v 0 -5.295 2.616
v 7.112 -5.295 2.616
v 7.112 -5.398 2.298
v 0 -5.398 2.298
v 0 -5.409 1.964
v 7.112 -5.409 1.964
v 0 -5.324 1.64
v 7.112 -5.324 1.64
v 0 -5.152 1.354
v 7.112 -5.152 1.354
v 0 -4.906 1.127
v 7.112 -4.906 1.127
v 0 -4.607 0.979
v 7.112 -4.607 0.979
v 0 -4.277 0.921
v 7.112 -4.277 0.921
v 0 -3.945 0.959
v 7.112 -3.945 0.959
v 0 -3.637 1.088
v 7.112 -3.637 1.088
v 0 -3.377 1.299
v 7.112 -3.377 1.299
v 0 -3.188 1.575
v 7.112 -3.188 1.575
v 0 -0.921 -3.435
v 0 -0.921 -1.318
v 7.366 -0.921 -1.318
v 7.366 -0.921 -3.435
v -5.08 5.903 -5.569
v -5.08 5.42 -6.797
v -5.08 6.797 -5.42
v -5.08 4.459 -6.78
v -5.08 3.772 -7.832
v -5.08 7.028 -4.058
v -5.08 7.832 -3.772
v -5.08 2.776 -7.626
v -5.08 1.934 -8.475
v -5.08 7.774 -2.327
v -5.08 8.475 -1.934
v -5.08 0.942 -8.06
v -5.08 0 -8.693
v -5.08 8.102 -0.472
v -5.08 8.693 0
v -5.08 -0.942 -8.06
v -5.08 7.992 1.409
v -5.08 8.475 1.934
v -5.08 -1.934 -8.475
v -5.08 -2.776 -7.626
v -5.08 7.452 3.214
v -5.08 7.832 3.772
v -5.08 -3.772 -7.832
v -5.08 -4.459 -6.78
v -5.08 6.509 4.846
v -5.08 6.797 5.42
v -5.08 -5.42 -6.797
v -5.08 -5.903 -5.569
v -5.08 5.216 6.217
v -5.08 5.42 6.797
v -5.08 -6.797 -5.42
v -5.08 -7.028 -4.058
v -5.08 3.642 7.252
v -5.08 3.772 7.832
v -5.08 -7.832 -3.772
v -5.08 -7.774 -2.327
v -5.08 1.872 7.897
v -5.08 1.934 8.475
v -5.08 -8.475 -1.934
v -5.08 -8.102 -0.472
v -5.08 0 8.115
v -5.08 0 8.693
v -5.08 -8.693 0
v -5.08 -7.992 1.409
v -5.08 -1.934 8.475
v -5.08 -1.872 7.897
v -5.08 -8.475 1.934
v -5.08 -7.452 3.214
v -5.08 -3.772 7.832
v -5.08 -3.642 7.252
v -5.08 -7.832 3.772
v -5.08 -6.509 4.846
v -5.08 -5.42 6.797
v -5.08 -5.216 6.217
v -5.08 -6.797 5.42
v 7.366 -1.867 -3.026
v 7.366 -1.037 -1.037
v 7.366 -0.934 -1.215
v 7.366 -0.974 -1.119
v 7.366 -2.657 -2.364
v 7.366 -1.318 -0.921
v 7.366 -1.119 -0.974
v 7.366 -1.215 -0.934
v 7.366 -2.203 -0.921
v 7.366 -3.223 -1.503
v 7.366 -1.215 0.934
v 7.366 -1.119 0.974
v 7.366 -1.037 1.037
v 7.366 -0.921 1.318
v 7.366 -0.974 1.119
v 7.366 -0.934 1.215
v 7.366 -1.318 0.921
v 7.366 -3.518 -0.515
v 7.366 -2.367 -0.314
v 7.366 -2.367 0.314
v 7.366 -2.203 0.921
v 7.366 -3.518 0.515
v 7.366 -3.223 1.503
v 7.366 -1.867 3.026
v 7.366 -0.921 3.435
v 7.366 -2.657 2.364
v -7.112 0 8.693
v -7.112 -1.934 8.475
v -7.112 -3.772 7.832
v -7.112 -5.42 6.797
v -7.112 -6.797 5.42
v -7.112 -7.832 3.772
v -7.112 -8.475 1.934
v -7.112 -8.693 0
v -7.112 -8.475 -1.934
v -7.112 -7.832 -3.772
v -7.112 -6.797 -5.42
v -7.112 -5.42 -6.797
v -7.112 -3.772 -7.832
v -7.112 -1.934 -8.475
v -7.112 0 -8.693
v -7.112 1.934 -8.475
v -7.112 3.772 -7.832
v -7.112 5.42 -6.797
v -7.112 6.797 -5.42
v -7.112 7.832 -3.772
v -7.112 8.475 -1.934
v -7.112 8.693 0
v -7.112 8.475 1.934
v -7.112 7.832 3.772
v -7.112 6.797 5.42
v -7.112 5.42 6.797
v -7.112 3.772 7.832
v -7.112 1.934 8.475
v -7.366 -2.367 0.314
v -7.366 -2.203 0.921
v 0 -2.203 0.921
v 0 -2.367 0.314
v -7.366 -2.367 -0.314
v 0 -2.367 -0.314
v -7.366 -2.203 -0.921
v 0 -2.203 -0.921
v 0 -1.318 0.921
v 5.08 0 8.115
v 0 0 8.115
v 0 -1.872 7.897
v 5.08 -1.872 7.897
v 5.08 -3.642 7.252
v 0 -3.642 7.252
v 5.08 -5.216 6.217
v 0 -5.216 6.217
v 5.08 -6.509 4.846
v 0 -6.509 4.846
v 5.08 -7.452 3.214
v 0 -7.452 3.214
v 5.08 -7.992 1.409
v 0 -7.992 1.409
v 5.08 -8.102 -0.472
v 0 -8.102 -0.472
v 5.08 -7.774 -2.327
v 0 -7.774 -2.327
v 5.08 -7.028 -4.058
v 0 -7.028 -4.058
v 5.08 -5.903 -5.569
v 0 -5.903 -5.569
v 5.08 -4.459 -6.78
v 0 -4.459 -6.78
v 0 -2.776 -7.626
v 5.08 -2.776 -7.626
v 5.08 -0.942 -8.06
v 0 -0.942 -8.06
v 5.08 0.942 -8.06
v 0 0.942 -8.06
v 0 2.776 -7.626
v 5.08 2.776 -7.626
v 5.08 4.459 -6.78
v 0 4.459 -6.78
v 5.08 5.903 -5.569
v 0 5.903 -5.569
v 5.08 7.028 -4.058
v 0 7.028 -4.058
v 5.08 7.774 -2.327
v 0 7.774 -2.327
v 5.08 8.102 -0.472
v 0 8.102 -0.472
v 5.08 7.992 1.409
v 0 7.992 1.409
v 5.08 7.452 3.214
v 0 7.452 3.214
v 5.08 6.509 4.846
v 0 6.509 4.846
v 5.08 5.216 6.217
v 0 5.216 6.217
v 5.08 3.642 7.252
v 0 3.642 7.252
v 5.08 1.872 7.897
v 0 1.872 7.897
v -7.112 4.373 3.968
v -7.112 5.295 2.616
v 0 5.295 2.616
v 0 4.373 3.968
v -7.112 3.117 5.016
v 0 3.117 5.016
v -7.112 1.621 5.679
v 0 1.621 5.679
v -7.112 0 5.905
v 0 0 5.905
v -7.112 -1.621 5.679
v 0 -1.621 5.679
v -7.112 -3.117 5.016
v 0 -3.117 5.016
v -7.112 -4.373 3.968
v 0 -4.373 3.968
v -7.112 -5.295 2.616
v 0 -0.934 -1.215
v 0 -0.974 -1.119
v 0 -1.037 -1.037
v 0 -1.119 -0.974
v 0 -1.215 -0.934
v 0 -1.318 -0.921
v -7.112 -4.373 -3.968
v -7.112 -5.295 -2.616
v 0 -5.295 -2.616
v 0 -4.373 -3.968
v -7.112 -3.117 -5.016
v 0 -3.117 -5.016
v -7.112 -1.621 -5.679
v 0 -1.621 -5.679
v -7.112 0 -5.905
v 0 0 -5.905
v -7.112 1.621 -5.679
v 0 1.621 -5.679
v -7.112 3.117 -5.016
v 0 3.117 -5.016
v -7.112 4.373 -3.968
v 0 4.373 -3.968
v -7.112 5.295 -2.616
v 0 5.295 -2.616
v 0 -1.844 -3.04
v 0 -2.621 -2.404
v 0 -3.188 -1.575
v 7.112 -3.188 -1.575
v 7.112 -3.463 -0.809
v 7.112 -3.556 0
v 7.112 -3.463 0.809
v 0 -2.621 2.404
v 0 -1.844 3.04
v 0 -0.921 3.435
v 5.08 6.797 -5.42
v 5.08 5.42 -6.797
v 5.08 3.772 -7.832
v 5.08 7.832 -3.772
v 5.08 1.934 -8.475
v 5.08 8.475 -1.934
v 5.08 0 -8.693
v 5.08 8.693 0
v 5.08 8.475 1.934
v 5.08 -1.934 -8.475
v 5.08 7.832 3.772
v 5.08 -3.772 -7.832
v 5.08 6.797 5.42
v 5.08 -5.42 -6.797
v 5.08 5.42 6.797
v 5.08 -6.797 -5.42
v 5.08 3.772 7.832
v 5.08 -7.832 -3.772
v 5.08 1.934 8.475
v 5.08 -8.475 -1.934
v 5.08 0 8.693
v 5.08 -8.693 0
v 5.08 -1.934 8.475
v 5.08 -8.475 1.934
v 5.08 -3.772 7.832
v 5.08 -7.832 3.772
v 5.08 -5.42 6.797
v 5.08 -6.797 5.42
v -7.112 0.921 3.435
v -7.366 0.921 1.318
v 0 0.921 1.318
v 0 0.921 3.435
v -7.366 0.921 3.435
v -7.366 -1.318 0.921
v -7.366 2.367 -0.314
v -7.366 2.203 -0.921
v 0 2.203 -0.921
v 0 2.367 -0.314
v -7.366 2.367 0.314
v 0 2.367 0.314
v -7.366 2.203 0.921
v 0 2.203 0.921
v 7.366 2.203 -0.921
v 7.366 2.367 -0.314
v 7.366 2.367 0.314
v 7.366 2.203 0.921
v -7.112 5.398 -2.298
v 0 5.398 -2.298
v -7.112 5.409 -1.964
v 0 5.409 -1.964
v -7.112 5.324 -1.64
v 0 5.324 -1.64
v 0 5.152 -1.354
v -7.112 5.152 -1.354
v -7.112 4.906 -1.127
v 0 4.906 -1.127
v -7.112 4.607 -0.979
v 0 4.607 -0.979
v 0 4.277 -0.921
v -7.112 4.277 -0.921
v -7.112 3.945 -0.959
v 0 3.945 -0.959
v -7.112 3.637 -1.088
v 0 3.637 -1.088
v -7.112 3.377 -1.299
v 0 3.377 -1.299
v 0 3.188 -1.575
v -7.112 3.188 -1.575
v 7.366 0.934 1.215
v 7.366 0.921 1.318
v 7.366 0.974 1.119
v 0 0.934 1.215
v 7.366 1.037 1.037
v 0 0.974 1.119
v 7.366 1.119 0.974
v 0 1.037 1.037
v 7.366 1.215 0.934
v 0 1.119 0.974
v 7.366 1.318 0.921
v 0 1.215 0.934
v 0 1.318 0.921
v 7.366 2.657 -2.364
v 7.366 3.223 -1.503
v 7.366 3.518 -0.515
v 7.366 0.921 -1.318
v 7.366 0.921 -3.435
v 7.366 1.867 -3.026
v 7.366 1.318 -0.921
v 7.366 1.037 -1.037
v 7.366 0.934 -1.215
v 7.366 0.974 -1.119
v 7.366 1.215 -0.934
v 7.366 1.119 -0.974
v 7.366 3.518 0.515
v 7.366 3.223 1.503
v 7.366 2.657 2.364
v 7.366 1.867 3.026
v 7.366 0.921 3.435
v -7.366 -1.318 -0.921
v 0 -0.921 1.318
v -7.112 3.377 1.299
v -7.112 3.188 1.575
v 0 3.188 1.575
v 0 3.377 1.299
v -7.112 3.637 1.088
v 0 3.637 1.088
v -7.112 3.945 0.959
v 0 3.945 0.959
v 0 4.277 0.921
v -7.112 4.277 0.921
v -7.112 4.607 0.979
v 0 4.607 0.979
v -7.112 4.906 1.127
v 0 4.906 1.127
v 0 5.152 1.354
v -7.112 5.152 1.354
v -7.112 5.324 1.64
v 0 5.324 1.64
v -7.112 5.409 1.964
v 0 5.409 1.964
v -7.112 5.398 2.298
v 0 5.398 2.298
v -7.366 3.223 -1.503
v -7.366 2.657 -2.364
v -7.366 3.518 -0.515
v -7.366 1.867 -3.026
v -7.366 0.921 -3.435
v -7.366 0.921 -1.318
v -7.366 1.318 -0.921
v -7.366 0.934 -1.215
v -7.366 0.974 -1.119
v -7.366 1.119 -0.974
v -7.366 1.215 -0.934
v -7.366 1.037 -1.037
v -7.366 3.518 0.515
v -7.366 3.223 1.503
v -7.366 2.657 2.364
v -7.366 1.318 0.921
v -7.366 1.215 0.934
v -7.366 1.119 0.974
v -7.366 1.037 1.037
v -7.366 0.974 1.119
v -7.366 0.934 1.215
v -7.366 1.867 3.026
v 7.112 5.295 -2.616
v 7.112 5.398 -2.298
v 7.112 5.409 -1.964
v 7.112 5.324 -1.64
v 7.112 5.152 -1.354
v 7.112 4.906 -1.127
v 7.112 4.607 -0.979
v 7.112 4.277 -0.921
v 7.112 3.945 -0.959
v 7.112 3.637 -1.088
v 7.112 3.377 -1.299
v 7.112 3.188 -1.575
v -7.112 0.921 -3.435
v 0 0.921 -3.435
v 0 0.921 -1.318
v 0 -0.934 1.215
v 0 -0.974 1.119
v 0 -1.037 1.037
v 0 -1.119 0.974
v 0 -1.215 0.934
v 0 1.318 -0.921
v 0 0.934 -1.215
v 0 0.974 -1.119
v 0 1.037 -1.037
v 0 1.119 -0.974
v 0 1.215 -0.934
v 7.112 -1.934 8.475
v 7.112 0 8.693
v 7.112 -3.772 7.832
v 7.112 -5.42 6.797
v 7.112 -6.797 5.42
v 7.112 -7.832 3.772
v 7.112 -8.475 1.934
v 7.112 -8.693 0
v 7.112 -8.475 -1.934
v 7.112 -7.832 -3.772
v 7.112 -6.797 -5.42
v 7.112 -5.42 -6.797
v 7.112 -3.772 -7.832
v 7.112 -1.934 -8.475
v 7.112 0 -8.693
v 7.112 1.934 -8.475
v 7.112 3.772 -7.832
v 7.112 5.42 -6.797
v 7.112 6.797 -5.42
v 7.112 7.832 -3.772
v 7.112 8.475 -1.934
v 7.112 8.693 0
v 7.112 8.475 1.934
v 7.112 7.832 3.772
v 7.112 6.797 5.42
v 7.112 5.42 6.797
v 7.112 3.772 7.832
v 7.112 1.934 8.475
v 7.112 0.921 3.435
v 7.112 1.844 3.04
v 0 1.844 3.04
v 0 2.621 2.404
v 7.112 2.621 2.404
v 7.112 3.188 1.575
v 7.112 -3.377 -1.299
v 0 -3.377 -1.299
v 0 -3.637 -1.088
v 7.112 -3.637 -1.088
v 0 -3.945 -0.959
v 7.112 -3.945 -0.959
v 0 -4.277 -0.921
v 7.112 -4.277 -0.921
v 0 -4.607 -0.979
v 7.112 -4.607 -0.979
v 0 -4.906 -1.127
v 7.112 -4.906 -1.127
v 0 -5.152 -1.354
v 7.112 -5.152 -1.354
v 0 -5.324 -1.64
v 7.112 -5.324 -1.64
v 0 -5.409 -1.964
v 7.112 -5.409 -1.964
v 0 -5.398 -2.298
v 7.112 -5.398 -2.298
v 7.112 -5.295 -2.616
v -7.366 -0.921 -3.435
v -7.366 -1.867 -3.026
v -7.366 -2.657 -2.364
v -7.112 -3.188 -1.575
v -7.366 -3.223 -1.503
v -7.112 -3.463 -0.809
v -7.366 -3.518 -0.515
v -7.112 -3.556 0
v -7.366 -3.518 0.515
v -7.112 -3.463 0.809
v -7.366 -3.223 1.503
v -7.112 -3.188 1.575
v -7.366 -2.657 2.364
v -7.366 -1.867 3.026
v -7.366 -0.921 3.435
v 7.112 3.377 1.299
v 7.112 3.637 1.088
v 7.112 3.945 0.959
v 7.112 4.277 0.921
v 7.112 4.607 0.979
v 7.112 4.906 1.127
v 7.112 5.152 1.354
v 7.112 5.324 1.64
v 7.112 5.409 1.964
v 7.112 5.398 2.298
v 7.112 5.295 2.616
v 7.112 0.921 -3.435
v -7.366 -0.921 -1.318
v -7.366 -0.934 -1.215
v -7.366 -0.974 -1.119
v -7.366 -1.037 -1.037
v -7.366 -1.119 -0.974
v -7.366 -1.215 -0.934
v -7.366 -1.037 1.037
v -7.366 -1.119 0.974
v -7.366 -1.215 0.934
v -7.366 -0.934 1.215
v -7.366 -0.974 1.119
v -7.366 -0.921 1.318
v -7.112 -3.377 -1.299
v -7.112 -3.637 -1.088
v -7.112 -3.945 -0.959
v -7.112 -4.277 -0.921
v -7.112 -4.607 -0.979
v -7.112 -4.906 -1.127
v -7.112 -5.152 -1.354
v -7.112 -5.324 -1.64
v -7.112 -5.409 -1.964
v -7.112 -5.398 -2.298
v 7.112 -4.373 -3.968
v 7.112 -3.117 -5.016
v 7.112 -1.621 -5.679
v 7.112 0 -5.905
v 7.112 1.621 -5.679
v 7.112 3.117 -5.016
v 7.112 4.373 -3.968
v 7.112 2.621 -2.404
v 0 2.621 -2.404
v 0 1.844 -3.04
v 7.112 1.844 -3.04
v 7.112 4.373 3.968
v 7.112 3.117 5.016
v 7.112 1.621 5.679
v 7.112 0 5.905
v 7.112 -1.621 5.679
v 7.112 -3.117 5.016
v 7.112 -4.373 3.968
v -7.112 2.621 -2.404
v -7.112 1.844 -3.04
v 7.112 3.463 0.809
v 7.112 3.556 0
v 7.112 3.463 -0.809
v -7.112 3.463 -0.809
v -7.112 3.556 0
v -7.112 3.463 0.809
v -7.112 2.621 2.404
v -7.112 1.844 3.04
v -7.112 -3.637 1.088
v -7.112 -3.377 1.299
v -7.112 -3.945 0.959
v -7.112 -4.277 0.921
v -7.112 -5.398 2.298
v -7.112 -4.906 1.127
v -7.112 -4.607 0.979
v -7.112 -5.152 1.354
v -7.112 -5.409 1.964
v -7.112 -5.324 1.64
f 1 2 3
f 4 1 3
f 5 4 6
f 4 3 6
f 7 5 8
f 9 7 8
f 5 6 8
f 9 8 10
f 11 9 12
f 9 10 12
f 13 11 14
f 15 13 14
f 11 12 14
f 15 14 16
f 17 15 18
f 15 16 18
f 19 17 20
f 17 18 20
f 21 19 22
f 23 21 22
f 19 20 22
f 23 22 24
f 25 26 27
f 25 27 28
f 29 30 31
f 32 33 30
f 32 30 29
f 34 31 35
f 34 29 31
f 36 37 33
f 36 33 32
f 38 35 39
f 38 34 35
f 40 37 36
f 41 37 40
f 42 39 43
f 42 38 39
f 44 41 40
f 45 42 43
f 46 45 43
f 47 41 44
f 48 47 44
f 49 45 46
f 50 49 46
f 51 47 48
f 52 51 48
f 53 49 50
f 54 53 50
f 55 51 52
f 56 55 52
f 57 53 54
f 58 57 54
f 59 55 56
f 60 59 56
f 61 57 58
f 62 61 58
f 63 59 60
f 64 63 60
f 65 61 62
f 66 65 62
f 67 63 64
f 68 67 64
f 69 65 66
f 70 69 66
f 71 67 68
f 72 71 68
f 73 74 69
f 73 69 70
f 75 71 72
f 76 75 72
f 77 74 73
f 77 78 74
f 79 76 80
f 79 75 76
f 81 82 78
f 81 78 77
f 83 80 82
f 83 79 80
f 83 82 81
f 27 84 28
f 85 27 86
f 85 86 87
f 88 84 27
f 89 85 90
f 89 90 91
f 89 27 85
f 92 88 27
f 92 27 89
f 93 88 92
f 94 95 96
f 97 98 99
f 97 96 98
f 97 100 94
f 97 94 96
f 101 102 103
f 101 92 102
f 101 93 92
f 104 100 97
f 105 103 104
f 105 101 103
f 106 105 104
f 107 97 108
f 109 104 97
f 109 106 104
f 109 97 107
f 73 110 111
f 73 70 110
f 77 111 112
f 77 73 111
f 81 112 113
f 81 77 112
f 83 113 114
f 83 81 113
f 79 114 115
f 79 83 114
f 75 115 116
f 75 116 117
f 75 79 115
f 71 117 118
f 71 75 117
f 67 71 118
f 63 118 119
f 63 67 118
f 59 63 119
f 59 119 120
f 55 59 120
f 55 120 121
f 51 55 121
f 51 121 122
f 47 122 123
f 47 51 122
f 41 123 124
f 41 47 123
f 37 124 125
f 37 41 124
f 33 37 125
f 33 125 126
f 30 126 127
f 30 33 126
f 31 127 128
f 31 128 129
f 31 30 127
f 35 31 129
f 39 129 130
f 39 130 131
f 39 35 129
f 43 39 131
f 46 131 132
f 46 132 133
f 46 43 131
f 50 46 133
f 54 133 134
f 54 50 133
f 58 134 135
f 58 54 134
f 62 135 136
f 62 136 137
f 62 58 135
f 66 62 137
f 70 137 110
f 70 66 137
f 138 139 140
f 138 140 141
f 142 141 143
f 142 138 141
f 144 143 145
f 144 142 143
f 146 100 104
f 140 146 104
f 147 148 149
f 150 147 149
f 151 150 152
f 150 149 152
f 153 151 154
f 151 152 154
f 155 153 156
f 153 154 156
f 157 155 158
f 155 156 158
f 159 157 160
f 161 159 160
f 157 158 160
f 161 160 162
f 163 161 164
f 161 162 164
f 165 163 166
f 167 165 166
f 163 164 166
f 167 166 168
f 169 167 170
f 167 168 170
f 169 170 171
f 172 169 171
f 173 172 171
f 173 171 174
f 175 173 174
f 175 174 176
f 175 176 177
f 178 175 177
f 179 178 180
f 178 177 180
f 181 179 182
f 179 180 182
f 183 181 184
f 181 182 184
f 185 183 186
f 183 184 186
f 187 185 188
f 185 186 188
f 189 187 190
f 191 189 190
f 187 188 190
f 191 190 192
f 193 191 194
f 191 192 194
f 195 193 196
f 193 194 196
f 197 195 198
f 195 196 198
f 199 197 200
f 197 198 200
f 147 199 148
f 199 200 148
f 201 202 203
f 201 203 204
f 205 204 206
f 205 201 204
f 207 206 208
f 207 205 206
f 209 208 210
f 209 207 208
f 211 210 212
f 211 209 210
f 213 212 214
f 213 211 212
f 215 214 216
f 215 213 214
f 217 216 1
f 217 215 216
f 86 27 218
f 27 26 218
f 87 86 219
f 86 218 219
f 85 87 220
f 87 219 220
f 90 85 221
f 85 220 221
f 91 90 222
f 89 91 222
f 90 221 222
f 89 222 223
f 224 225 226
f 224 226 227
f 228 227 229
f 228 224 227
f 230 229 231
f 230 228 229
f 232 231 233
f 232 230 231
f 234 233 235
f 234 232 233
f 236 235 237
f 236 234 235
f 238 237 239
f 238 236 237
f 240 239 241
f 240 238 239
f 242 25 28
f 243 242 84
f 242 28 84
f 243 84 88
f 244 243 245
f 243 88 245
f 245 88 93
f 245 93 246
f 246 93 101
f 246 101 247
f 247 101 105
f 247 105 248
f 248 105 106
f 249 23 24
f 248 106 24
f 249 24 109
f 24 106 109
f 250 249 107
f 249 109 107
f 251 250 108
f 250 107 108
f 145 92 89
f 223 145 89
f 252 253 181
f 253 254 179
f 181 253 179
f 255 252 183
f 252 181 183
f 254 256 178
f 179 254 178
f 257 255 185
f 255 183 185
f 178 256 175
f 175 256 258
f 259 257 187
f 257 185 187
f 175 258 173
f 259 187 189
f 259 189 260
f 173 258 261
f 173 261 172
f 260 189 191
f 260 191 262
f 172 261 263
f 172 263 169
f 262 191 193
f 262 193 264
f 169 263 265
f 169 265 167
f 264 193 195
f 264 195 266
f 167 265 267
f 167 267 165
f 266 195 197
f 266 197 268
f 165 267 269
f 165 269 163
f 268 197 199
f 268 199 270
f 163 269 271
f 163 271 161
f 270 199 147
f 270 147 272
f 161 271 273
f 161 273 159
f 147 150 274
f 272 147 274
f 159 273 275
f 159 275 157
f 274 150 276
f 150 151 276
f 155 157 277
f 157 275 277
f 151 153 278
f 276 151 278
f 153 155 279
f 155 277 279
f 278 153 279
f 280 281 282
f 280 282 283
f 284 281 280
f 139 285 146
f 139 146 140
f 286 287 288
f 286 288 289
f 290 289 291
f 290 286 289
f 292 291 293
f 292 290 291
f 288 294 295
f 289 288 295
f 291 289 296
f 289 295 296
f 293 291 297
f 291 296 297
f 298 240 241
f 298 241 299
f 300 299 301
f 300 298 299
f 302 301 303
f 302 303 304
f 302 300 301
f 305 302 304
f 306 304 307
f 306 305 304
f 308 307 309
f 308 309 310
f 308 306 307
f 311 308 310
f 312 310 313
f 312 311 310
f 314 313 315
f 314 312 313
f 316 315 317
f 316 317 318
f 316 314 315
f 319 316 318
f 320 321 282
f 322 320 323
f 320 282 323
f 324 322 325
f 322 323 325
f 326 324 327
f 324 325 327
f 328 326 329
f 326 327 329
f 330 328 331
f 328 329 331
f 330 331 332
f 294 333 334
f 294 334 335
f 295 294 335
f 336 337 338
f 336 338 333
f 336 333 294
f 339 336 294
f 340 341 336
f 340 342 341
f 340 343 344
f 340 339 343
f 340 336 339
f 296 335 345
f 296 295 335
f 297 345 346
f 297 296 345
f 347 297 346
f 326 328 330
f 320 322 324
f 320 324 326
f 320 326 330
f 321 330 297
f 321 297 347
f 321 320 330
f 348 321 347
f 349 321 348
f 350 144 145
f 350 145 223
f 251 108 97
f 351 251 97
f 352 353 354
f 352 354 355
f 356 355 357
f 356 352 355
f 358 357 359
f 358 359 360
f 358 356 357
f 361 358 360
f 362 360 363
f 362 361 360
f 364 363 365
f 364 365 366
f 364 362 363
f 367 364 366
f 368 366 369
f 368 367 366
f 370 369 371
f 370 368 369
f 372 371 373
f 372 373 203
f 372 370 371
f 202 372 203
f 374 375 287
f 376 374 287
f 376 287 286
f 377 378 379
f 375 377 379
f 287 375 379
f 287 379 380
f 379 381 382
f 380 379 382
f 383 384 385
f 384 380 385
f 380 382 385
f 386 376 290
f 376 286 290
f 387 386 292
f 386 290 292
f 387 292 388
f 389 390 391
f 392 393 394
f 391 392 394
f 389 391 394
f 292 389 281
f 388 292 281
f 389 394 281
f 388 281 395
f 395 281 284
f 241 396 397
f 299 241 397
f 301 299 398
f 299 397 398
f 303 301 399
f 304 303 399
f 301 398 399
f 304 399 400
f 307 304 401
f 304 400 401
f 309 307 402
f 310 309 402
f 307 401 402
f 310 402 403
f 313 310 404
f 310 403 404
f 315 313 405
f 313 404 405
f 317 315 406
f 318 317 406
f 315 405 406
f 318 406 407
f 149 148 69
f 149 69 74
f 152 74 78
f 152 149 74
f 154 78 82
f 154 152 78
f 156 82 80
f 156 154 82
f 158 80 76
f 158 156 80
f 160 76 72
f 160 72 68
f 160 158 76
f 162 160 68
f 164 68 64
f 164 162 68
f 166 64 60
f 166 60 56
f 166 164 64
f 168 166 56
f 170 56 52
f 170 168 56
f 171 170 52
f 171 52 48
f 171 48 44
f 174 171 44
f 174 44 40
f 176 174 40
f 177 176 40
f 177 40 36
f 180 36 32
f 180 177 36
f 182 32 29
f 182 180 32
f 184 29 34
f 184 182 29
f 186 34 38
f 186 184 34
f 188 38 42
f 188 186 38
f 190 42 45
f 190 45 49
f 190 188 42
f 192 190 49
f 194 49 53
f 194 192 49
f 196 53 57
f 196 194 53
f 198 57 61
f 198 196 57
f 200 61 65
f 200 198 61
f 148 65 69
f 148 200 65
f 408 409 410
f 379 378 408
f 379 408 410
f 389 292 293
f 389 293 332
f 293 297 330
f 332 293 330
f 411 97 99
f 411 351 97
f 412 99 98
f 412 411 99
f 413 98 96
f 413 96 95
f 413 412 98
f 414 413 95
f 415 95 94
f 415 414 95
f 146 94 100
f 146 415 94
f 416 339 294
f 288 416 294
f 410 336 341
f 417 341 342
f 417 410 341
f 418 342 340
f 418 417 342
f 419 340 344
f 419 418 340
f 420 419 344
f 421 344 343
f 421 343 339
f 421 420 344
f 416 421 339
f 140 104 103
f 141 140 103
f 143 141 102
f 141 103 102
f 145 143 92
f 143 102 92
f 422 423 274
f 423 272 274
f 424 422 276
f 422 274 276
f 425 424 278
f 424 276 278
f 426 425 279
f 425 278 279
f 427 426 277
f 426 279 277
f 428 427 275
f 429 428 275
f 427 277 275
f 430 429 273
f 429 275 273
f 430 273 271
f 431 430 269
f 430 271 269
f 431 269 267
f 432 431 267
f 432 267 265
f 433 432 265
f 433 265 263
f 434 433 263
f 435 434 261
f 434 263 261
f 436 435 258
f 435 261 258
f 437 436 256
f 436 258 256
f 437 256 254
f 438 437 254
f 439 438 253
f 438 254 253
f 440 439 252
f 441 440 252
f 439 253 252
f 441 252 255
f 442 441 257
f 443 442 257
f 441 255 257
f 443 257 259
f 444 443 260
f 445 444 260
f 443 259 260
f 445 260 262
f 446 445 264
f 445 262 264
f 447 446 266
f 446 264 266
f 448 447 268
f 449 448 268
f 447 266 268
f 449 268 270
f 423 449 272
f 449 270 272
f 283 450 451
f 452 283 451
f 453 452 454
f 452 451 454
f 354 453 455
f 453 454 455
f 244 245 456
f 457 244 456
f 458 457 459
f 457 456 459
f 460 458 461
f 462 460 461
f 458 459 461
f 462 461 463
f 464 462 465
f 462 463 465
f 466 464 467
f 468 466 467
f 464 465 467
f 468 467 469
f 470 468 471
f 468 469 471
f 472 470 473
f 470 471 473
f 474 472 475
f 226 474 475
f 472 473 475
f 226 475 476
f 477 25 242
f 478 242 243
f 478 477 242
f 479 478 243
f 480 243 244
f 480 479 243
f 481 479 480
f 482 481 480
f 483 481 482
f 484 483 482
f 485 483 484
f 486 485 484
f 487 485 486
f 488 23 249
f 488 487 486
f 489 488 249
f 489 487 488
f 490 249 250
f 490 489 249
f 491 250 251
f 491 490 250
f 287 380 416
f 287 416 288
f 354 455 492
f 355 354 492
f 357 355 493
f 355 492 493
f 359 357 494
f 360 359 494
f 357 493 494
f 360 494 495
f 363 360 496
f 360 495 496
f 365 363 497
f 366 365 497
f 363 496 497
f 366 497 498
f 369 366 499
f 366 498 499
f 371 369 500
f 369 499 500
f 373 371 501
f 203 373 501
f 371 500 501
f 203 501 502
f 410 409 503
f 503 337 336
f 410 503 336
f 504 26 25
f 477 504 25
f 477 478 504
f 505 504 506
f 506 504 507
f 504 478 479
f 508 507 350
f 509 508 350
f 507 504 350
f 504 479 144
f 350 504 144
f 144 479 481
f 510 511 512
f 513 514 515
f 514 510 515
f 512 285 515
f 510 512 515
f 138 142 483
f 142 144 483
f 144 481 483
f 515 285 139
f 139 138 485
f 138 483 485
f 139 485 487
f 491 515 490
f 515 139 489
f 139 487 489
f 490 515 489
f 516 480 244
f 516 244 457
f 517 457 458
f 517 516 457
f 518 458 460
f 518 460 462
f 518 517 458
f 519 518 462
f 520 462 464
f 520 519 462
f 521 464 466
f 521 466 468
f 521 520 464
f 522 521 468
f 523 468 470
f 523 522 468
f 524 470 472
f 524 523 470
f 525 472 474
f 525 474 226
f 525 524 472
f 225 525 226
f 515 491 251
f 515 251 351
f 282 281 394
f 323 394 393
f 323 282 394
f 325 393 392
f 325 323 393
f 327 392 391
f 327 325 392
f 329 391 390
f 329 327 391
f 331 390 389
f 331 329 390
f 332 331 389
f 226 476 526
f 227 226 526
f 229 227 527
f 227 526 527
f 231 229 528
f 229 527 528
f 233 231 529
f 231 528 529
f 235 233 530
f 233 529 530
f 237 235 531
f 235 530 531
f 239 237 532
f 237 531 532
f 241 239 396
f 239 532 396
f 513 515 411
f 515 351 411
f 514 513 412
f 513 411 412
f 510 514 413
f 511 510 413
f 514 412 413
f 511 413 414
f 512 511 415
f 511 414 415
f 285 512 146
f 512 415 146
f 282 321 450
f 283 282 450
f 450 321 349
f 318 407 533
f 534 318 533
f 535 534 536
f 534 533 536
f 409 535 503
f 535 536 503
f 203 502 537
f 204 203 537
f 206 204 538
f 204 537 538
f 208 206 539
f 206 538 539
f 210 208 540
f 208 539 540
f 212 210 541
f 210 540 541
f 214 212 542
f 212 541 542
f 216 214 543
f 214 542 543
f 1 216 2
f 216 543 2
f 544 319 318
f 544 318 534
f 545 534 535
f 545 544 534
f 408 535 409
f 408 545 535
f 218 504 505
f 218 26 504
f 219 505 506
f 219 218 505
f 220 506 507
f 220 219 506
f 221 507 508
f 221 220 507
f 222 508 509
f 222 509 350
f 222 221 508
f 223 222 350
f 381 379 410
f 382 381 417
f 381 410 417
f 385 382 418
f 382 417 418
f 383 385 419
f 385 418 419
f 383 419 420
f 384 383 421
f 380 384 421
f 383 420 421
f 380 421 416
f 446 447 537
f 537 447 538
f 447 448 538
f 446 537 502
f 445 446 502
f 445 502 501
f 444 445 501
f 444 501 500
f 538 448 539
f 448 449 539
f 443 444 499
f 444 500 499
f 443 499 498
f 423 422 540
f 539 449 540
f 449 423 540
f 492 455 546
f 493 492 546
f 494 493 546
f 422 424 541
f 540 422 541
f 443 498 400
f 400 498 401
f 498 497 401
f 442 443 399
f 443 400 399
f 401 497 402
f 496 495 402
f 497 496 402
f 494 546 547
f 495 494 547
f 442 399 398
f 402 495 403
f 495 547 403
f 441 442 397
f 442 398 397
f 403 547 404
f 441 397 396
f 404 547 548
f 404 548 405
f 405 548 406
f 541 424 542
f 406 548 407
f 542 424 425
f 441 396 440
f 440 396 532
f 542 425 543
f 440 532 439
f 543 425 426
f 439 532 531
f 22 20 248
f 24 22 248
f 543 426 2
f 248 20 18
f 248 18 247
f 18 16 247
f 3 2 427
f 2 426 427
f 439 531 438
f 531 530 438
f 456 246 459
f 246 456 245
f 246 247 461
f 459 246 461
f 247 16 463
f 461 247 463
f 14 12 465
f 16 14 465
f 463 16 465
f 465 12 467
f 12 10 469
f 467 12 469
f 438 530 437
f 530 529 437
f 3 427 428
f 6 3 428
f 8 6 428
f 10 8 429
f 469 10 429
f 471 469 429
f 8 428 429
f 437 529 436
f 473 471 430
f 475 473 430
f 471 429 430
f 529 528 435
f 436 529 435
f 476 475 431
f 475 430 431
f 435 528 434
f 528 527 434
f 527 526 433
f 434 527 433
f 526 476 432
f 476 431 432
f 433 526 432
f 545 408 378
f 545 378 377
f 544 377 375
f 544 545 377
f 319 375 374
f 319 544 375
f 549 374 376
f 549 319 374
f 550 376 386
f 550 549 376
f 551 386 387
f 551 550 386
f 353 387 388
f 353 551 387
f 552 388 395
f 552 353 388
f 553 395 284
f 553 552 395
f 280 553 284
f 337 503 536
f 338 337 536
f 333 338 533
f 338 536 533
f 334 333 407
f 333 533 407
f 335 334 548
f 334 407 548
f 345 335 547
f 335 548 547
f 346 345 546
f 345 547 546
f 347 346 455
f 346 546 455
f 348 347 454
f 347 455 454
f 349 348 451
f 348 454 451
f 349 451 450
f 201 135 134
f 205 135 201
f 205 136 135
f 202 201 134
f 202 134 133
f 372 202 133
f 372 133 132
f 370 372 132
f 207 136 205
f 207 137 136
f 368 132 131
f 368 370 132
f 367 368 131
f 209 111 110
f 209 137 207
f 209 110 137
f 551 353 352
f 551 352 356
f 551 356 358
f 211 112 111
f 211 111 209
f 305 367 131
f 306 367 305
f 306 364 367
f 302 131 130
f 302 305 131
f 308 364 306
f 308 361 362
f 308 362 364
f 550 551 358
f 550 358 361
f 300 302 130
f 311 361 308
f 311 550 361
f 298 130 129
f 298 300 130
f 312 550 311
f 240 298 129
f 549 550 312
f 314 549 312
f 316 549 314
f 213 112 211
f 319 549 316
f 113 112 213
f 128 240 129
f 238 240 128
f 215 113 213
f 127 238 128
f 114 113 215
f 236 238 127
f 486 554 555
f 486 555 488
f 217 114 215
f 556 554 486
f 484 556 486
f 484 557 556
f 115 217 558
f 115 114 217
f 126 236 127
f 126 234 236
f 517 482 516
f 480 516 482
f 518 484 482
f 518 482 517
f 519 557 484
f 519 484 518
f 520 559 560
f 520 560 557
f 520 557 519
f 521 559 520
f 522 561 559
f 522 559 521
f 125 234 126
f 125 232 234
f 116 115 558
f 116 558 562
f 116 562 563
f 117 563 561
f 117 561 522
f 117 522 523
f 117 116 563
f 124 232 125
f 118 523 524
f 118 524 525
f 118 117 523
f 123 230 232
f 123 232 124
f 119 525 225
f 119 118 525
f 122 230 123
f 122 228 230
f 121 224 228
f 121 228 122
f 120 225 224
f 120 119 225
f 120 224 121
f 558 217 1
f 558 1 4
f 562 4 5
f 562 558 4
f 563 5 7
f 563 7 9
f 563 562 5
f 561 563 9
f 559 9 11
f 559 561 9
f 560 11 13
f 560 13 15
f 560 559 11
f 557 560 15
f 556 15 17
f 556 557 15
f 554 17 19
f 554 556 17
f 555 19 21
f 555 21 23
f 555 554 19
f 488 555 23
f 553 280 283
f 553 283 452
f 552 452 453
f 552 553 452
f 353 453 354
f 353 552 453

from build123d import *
from build123d.topology import SkipClean

# Parameters (mm, degrees)
SKETCH2_R           = 3.556
BOSS_EXTRUDE1_DEPTH = 0.254
CUT_EXTRUDE1_DEPTH  = 15.202896108
CUT_EXTRUDE2_DEPTH  = 15.331771344
FILLET1_R           = 0.396875


with BuildPart() as part:
    # Sketch1 → Base-Revolve (revolve)
    with BuildSketch(Plane.XY, mode=Mode.PRIVATE) as base_revolve_sk:
        Polygon((7.112, 0), (7.112, 8.69315), (5.08, 8.69315), (5.08, 8.1153), (3.556, 8.1153), (0, 8.1153), (0, 0), align=None)
    revolve(base_revolve_sk.sketch.rotate(Axis((0, 0, 0), (1, 0, 0)), 90), axis=Axis((0, 0, 0), (1, 0, 0)))

    # Sketch2 → Boss-Extrude1 (add)
    with BuildSketch(Plane(origin=(7.112, 0, 0), x_dir=(0, 0, -1), z_dir=(1, 0, 0))):
        with Locations(Location((0, 0, 0), (0, 0, 180))):
            Circle(SKETCH2_R)
    extrude(amount=BOSS_EXTRUDE1_DEPTH)

    # Sketch3 → Cut-Extrude1 (cut, through all)
    with SkipClean():  # the faces are left unmerged after this step: merging them gives an invalid solid
        with BuildSketch(Plane(origin=(7.112, 0, 0), x_dir=(0, 0, -1), z_dir=(1, 0, 0))):
            with BuildLine():
                ThreePointArc((2.61585906, -5.29454546), (5.9055, 0), (2.61585906, 5.29454546))
                ThreePointArc((2.61585906, 5.29454546), (1.042283968, 4.761688488), (1.57514094, 3.188113395))
                ThreePointArc((1.57514094, 3.188113395), (3.556, 0), (1.57514094, -3.188113395))
                ThreePointArc((1.57514094, -3.188113395), (1.042283968, -4.761688488), (2.61585906, -5.29454546))
            make_face()
            with BuildLine():
                ThreePointArc((-2.61585906, -5.29454546), (-1.042283968, -4.761688488), (-1.57514094, -3.188113395))
                ThreePointArc((-1.57514094, -3.188113395), (-3.556, 0), (-1.57514094, 3.188113395))
                ThreePointArc((-1.57514094, 3.188113395), (-1.042283968, 4.761688488), (-2.61585906, 5.29454546))
                ThreePointArc((-2.61585906, 5.29454546), (-5.9055, 0), (-2.61585906, -5.29454546))
            make_face()
        extrude(amount=-CUT_EXTRUDE1_DEPTH, mode=Mode.SUBTRACT)

    # Sketch4 → Cut-Extrude2 (cut, through all)
    with SkipClean():  # the faces are left unmerged after this step: merging them gives an invalid solid
        with BuildSketch(Plane(origin=(7.366, 0, 0), x_dir=(0, 0, -1), z_dir=(1, 0, 0))):
            with BuildLine():
                Line((3.434727855, 0.92075), (0.92075, 0.92075))
                Line((0.92075, 0.92075), (0.92075, 2.202919244))
                ThreePointArc((0.92075, 2.202919244), (0, 2.3876), (-0.92075, 2.202919244))
                Line((-0.92075, 2.202919244), (-0.92075, 0.92075))
                Line((-0.92075, 0.92075), (-3.434727855, 0.92075))
                ThreePointArc((-3.434727855, 0.92075), (-3.556, 0), (-3.434727855, -0.92075))
                Line((-3.434727855, -0.92075), (-0.92075, -0.92075))
                Line((-0.92075, -0.92075), (-0.92075, -2.202919244))
                ThreePointArc((-0.92075, -2.202919244), (0, -2.3876), (0.92075, -2.202919244))
                Line((0.92075, -2.202919244), (0.92075, -0.92075))
                Line((0.92075, -0.92075), (3.434727855, -0.92075))
                ThreePointArc((3.434727855, -0.92075), (3.556, 0), (3.434727855, 0.92075))
            make_face()
        extrude(amount=-CUT_EXTRUDE2_DEPTH, mode=Mode.SUBTRACT)

    # Fillet1
    fillet1_edges = [part.edges().sort_by_distance(p)[0] for p in [
        (3.683, -0.92075, -0.92075),
        (3.683, -0.92075, 0.92075),
        (3.683, 0.92075, 0.92075),
        (3.683, 0.92075, -0.92075),
    ]]
    fillet(fillet1_edges, radius=FILLET1_R)

    # Boss-Mirror1: part across face


with BuildPart() as part_1:
    with SkipClean():  # the faces are left unmerged after this step: merging them gives an invalid solid
        add(part.part)
        add(part.part.mirror(Plane.ZY))


solid = part_1.part
